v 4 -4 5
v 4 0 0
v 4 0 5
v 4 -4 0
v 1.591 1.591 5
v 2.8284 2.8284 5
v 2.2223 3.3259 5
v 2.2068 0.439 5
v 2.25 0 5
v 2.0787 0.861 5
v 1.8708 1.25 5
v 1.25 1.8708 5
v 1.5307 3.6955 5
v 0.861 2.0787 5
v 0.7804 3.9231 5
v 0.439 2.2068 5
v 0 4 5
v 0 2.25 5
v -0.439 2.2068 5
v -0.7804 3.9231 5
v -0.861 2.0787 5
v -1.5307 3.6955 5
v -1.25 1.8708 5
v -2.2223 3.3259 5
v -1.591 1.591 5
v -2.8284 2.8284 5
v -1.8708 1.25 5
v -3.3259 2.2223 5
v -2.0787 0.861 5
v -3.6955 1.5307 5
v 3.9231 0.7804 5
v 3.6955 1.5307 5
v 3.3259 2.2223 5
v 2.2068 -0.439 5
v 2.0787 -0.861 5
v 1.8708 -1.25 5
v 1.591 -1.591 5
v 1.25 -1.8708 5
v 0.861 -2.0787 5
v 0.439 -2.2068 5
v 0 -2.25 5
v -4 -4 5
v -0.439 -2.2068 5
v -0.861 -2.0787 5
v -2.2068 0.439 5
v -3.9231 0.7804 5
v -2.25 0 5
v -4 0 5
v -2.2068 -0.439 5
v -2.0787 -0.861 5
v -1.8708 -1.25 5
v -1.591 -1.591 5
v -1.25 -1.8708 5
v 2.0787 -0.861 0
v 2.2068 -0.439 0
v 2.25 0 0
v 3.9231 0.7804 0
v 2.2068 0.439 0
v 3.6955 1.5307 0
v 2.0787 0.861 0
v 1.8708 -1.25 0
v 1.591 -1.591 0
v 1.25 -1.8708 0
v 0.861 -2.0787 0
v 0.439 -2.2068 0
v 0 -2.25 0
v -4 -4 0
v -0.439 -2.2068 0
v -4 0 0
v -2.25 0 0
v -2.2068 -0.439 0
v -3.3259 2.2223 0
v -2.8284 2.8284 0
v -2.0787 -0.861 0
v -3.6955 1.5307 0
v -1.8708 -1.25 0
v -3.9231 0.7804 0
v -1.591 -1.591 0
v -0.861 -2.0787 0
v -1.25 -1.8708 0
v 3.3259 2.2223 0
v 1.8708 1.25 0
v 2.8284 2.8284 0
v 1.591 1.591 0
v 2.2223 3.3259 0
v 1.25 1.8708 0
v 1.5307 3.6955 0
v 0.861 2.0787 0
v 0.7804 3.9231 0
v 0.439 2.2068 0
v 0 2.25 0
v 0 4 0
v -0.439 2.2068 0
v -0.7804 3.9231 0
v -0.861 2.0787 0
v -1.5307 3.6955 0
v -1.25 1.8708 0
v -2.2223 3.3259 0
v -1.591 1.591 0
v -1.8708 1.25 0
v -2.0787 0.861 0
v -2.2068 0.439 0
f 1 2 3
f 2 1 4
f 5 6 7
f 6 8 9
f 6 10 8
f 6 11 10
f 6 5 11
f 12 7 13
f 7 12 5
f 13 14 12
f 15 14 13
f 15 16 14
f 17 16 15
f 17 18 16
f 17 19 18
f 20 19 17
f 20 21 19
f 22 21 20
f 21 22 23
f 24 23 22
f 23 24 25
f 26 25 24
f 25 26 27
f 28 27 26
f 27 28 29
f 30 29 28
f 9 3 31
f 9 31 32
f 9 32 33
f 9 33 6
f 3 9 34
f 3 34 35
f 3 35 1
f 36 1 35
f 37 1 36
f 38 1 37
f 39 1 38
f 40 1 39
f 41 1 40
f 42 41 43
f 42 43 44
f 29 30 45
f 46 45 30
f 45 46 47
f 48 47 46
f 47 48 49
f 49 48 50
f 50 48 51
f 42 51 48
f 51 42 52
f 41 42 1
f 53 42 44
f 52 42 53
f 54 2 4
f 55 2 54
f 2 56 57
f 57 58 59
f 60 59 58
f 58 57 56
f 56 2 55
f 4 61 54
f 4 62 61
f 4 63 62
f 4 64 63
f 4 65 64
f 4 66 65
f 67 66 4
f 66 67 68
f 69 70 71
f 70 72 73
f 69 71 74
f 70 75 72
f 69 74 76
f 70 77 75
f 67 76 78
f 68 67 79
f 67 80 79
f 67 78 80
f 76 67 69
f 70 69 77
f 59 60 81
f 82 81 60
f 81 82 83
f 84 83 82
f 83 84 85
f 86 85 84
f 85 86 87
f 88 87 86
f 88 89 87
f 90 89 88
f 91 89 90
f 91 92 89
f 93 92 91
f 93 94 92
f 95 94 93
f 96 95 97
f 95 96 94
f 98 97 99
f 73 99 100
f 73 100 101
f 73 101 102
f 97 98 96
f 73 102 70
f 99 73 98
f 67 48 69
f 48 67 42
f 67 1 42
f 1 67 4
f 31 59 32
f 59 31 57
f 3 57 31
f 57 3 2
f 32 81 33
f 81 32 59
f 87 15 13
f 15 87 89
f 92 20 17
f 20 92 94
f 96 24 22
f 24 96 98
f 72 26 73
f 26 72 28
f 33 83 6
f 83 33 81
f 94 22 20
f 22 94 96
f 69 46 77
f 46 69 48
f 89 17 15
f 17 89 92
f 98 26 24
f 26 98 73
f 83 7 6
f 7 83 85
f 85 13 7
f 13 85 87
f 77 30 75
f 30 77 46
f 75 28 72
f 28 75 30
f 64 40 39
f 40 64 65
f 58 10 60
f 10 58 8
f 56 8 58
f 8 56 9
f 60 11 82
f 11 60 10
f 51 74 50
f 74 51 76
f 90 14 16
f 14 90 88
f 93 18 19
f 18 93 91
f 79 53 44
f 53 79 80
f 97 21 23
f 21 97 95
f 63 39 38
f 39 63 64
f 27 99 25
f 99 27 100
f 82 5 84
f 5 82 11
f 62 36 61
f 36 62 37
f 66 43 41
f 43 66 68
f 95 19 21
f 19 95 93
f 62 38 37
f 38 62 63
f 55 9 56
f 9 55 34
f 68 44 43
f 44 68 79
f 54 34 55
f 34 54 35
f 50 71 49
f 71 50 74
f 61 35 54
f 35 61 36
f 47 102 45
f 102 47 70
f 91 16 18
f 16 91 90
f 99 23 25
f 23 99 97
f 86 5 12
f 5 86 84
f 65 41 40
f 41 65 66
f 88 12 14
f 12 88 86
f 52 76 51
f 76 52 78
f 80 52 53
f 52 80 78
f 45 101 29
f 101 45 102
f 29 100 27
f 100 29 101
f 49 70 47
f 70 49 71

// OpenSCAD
// Module for mounting post with optional support
module mounting_post_assembly(height, diameter, with_support = true, support_height = 0.5) {
  // Main post
  cylinder(h = height, d = diameter, $fn = 32);
  
  // Optional support base
  if (with_support) {
    translate([0, 0, -support_height])
      cylinder(h = support_height, d1 = diameter + 2, d2 = diameter, $fn = 32);
  }
}

// Module for a post with a riser base
module post_with_riser(post_height, post_diameter, riser_height, riser_diameter = 4) {
  // Riser
  cylinder(h = riser_height, d = riser_diameter, $fn = 32);
  
  // Post on top of riser
  translate([0, 0, riser_height - 0.5]) {
    mounting_post_assembly(post_height, post_diameter, true, 0.5);
  }
}

module post_socket(height, post_diameter, thickness = 1, clearance = 0.4) {
  difference() {
    cylinder(h = height, d = post_diameter + thickness, $fn = 32);
    translate([0, 0, -0.01])
    cylinder(h = height, d = post_diameter + clearance, $fn = 32);
  }
}

// Module for corner risers
module corner_riser(width, height) {
  cube([width, width, height]);
}

module screw_insert_tab(insert_diameter, tab_width, tab_height) {
  translate([-(tab_width/2), -(tab_width/2), 0])
  difference() {
    union() {
      cube([tab_width, tab_width/2, tab_height]);

      translate([tab_width/2, tab_width/2, 0])
        cylinder(h = tab_height, d = tab_width, $fn = 32);
    }

    translate([tab_width/2, tab_width/2, -0.01])
      cylinder(h = tab_height + 0.02, d = insert_diameter, $fn = 32);
  }
}

module screw_tab(tab_width, 
  tab_height, 
  screw_diameter, 
  screw_head_height, 
  screw_head_width) {

  translate([-(tab_width/2), -(tab_width/2), 0])
  difference() {
    union() {
      cube([tab_width, tab_width/2, tab_height]);

      translate([tab_width/2, tab_width/2, 0])
        cylinder(h = tab_height, d = tab_width, $fn = 32);
    }

    translate([tab_width/2, 
      tab_width/2, 
      -0.01])
      cylinder(h = tab_height + 0.02, 
        d = screw_diameter, 
        $fn = 32);
    
    translate([tab_width/2, 
      tab_width/2, 
      tab_height - screw_head_height])
      cylinder(h = screw_head_height + 0.01,
        d1 = screw_diameter,
        d2 = screw_head_width,
        $fn = 32);
        
  }
}

screw_insert_tab(4.5, 8, 5);
